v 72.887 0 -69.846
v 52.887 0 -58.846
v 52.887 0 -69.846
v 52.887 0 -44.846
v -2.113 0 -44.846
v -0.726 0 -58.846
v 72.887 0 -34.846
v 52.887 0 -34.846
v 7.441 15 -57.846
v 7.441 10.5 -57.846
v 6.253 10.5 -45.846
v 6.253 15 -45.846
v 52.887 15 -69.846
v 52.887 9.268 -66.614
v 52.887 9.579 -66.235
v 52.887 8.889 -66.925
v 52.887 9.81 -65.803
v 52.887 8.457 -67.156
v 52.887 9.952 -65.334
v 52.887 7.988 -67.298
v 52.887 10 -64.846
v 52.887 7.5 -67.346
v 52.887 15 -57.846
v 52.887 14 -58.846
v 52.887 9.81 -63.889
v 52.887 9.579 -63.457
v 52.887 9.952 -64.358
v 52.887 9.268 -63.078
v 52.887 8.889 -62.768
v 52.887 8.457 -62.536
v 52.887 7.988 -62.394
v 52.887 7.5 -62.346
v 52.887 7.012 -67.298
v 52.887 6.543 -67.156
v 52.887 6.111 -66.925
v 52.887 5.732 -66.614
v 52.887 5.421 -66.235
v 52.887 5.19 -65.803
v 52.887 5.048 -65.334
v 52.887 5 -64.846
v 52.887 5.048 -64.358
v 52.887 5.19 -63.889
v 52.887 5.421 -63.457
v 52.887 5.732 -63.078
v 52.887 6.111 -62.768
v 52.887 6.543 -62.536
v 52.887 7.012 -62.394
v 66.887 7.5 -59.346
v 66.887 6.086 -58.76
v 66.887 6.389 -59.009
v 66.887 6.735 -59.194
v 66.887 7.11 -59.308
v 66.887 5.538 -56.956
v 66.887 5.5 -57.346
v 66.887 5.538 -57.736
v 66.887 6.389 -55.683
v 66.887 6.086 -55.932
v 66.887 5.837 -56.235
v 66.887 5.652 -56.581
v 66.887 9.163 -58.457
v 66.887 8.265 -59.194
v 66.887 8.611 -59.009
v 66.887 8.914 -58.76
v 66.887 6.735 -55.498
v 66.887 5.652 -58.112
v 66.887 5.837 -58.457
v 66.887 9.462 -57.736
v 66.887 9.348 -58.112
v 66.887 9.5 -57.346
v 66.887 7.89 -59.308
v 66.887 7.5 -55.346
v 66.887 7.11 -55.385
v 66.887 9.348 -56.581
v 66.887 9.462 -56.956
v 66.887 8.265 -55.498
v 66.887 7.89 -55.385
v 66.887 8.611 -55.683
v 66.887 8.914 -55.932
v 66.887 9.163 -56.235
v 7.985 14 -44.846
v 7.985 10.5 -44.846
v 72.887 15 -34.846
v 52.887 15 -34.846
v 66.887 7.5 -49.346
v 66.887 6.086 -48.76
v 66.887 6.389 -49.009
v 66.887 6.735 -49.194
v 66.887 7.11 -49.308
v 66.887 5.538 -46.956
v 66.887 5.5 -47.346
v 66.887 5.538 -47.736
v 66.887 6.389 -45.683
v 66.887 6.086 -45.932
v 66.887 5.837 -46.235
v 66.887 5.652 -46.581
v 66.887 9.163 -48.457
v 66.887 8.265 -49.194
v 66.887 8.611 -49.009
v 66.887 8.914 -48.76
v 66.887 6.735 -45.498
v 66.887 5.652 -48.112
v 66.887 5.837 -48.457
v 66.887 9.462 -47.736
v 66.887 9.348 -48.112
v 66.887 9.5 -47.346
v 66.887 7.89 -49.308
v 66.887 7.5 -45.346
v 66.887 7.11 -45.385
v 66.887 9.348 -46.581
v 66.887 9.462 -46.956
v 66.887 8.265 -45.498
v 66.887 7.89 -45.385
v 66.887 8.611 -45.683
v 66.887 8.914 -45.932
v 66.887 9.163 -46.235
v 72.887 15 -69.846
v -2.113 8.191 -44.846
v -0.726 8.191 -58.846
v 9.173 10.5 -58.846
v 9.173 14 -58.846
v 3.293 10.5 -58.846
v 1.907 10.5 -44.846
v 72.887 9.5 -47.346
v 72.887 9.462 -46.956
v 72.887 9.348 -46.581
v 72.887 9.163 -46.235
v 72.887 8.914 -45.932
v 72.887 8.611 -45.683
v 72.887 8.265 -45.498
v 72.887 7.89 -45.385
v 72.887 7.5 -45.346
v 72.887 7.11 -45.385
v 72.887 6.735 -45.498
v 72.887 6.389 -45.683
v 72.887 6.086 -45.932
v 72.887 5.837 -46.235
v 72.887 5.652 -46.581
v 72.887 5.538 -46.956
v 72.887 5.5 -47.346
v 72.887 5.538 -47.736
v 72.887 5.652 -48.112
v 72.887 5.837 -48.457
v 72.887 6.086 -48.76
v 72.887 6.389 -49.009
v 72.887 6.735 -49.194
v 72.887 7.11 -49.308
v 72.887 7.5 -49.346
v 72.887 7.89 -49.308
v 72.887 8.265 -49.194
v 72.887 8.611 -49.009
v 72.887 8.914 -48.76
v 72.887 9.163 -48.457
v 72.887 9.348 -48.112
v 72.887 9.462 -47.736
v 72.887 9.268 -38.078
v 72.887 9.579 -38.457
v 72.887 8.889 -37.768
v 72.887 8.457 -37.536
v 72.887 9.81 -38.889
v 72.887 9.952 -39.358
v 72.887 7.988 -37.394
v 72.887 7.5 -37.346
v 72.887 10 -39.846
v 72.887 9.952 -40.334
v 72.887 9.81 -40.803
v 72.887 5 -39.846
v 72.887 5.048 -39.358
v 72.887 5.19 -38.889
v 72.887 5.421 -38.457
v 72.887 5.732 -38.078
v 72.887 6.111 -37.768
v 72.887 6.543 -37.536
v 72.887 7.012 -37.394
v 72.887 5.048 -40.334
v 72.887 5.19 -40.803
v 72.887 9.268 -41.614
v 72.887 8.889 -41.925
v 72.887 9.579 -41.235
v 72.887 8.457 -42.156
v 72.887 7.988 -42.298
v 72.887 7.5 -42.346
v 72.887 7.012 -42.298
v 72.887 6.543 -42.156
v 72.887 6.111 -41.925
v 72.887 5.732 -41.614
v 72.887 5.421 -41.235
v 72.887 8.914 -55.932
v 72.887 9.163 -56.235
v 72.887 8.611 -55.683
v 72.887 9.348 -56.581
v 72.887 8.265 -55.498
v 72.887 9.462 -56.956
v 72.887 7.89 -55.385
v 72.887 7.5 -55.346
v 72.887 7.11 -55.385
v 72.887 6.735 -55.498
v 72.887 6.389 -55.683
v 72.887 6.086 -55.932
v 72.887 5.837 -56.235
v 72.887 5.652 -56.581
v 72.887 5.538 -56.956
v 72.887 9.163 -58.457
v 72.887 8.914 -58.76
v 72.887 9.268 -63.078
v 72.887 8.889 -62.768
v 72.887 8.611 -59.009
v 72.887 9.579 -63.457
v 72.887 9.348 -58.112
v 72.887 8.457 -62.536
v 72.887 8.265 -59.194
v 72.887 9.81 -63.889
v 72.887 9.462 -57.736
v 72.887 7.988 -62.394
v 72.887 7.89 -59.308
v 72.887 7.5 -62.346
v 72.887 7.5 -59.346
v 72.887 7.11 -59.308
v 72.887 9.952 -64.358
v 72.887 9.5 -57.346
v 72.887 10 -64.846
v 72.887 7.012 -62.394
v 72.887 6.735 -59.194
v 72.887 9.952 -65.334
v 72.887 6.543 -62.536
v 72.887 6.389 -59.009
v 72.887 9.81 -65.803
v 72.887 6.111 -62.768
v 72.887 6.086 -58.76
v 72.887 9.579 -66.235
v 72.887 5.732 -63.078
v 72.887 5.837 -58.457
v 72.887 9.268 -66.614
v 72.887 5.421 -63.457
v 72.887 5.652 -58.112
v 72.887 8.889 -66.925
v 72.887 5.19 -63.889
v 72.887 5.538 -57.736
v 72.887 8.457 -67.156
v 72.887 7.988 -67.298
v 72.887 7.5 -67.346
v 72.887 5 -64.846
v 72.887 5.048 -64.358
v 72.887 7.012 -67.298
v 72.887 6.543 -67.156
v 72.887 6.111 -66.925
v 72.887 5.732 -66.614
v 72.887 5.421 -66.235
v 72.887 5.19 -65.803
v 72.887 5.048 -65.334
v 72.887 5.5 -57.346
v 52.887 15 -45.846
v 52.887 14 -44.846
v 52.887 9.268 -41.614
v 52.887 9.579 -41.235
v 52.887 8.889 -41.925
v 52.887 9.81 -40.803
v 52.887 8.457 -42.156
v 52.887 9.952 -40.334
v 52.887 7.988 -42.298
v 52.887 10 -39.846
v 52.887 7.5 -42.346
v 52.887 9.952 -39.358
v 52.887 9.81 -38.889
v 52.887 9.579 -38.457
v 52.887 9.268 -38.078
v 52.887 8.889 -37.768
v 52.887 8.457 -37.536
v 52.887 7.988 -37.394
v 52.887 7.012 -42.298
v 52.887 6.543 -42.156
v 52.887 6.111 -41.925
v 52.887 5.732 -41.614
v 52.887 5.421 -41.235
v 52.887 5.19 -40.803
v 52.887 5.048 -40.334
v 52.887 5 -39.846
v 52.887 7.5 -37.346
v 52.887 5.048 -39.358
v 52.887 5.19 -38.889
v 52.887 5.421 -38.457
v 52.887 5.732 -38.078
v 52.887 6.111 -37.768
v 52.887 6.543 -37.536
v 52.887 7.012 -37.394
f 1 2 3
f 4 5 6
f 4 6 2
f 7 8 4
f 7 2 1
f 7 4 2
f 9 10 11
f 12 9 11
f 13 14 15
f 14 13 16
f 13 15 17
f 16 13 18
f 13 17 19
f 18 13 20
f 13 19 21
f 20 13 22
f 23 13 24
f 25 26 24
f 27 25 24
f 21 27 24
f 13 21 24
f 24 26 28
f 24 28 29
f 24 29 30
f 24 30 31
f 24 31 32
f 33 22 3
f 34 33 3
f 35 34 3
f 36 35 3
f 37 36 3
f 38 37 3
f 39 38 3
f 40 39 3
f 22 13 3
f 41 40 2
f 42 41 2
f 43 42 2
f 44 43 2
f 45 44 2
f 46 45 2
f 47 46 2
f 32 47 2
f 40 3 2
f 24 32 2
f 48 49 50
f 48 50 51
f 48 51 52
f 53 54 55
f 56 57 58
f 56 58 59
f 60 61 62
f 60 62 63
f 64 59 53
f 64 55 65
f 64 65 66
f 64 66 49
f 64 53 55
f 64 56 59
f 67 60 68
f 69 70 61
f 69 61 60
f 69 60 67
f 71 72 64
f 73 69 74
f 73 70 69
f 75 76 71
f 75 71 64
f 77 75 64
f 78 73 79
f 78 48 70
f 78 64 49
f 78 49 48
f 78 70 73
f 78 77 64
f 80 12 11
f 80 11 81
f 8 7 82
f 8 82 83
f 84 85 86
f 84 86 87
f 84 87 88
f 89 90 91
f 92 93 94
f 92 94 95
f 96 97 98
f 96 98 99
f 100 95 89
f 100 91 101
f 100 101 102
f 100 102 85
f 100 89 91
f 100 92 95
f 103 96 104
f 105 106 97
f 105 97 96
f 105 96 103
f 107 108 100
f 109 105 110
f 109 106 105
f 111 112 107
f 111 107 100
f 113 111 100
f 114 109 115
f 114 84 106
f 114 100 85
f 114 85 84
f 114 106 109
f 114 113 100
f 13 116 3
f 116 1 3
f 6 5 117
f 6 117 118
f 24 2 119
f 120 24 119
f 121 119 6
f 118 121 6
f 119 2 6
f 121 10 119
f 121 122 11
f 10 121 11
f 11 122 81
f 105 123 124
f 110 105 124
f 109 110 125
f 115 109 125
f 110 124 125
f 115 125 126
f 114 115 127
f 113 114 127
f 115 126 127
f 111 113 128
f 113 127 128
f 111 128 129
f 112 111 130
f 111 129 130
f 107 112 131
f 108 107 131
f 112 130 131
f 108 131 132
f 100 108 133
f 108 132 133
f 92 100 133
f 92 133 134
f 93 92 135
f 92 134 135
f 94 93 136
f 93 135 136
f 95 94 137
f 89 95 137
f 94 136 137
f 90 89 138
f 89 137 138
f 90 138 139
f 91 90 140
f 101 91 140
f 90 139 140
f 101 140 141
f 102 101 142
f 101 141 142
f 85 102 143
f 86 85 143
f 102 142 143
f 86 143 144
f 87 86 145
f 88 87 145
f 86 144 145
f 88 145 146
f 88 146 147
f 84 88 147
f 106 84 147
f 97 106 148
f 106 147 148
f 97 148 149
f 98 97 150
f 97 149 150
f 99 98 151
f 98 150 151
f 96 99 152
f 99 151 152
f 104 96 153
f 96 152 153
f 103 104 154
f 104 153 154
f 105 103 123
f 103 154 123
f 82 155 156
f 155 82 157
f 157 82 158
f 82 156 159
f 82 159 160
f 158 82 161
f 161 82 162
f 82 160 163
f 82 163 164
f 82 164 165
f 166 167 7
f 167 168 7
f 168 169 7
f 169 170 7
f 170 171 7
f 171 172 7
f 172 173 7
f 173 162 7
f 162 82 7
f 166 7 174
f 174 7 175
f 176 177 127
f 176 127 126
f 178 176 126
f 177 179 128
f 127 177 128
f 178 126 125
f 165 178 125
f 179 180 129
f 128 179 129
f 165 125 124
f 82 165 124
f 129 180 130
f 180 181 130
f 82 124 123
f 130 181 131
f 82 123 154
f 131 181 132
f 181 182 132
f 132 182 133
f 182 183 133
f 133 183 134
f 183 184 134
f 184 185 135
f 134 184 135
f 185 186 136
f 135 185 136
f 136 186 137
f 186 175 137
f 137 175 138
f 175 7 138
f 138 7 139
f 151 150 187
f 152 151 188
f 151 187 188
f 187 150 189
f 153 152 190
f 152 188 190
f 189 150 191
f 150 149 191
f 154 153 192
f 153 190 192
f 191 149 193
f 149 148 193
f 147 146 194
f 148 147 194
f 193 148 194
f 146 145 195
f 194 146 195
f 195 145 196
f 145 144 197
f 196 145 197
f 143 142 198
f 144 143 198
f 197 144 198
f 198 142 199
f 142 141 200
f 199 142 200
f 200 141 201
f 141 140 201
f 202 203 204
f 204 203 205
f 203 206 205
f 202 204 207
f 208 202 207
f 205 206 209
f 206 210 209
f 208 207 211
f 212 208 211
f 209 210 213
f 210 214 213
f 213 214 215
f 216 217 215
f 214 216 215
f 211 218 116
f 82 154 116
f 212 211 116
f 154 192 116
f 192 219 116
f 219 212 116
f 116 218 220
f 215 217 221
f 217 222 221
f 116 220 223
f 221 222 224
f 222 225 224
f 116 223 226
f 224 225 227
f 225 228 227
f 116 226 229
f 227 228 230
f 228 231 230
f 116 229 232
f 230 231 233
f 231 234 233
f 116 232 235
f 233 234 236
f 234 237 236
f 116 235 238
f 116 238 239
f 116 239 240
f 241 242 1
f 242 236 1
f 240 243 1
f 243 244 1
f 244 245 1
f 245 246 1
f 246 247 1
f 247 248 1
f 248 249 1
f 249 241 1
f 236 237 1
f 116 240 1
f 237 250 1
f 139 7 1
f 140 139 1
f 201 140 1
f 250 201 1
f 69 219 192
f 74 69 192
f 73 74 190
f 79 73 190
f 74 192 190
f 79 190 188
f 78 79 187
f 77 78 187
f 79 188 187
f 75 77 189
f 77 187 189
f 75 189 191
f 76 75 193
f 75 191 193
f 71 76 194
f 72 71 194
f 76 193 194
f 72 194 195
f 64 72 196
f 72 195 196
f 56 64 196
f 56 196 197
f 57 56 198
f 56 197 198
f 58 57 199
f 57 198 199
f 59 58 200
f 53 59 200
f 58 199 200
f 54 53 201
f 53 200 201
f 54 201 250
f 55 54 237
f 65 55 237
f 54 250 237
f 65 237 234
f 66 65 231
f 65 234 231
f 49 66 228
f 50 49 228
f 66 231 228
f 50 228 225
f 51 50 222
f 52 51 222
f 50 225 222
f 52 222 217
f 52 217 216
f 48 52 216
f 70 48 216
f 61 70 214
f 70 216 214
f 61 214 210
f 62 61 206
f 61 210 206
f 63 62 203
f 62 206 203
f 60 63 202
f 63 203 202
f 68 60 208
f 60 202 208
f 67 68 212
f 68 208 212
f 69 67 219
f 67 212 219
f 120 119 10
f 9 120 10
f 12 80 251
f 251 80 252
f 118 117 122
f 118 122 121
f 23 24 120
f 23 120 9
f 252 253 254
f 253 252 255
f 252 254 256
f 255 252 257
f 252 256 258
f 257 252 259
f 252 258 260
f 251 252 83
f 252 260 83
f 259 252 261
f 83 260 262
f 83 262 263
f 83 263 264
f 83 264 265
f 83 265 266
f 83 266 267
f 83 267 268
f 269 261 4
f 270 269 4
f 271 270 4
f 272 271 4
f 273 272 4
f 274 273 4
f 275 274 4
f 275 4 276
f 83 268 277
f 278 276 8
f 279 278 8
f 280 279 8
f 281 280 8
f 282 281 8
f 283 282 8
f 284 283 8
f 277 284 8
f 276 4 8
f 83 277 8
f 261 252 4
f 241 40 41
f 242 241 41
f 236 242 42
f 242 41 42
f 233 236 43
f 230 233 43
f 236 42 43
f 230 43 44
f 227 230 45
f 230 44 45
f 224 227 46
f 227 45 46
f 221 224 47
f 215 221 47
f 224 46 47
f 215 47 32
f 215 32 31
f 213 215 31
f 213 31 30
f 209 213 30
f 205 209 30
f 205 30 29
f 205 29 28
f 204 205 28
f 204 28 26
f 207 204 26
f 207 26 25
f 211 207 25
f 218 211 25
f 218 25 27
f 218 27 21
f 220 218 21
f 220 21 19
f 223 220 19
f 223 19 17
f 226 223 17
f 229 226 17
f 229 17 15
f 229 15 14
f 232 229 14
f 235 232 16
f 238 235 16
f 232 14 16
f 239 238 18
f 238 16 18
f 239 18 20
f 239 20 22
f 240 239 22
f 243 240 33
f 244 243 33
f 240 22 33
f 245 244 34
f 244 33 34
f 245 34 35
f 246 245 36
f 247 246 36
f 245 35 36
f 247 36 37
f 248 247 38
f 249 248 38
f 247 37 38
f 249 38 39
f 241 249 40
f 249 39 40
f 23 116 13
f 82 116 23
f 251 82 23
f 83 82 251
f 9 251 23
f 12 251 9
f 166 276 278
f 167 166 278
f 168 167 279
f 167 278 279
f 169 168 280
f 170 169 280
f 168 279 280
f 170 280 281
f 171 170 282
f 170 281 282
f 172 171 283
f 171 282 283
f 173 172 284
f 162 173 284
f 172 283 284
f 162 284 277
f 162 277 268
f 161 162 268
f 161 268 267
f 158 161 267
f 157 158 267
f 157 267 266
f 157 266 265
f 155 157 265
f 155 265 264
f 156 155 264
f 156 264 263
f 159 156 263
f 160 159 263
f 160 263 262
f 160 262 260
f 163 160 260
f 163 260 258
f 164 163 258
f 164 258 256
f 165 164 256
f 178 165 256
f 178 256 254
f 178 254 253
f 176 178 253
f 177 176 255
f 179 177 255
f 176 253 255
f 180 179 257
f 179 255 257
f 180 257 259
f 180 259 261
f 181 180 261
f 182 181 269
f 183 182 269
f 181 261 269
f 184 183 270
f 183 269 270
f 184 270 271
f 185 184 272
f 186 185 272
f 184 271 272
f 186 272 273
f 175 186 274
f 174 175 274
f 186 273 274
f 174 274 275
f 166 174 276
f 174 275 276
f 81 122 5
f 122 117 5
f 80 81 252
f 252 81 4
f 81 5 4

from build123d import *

# Parameters (mm, degrees)
F0_W     = 6
F0_H     = 4
F0_W_2   = 20
F0_H_2   = 5
F1_DEPTH = 10.5
F2_W     = 20
F2_H     = 5
F3_DEPTH = 4.5
F4_R     = 2.5
F5_DEPTH = 20.001
F6_R     = 2
F7_DEPTH = 6
F8_SIZE  = 1
F9_SIZE2 = 2.3094010768
F9_SIZE  = 4


with BuildPart() as f1:
    # F0 (on Front) → F1 (new body)
    with BuildSketch(Plane.XZ):
        Polygon((66.887199, -59.346183), (72.887199, -59.346183), (72.887199, -55.346183), (66.887199, -55.346183), (66.887199, -57.346183), align=None)
        Polygon((52.887199, -45.846183), (6.252832, -45.846183), (7.441181, -57.846183), (52.887199, -57.846183), (52.887199, -58.846183), (52.887199, -64.846183), (72.887199, -64.846183), (72.887199, -59.346183), (66.887199, -59.346183), (65.732498, -57.346183), (66.887199, -55.346183), (72.887199, -55.346183), (72.887199, -49.346183), (66.887199, -49.346183), (65.732498, -47.346183), (66.887199, -45.346183), (72.887199, -45.346183), (72.887199, -39.846183), (52.887199, -39.846183), (52.887199, -44.846183), align=None)
        with Locations((69.887199, -47.346183)):
            Rectangle(F0_W, F0_H)
        with Locations((62.887199, -37.346183)):
            Rectangle(F0_W_2, F0_H_2)
        with Locations((62.887199, -67.346183)):
            Rectangle(F0_W_2, F0_H_2)
        Polygon((2.754653, -58.846183), (1.368245, -44.846183), (-2.112801, -44.846183), (-0.726393, -58.846183), align=None)
        Polygon((7.984883, -44.846183), (1.368245, -44.846183), (2.754653, -58.846183), (9.173232, -58.846183), (7.441181, -57.846183), (6.252832, -45.846183), align=None)
        Polygon((52.887199, -44.846183), (7.984883, -44.846183), (6.252832, -45.846183), (52.887199, -45.846183), align=None)
        Polygon((7.441181, -57.846183), (9.173232, -58.846183), (52.887199, -58.846183), (52.887199, -57.846183), align=None)
        Polygon((65.732498, -57.346183), (66.887199, -59.346183), (66.887199, -57.346183), align=None)
        Polygon((66.887199, -49.346183), (66.887199, -45.346183), (65.732498, -47.346183), align=None)
        Polygon((65.732498, -57.346183), (66.887199, -57.346183), (66.887199, -55.346183), align=None)
    extrude(amount=-F1_DEPTH)

    # F2 (on face) → F3 (join)
    with BuildSketch(Plane(origin=(0, 10.5, 0), x_dir=(-1, 0, 0), z_dir=(0, 1, 0))):
        with Locations((-62.887199, -37.346183)):
            Rectangle(F2_W, F2_H)
        Polygon((-72.887199, -55.346183), (-72.887199, -59.346183), (-72.887199, -64.846183), (-52.887199, -64.846183), (-52.887199, -58.846183), (-9.173232, -58.846183), (-7.441181, -57.846183), (-6.252832, -45.846183), (-7.984883, -44.846183), (-52.887199, -44.846183), (-52.887199, -39.846183), (-72.887199, -39.846183), (-72.887199, -45.346183), (-72.887199, -49.346183), align=None)
        with Locations((-62.887199, -67.346183)):
            Rectangle(F2_W, F2_H)
    extrude(amount=F3_DEPTH)

    # F4 (on face) → F5 (cut, through all)
    with BuildSketch(Plane(origin=(52.887199, 0, 0), x_dir=(0, -1, 0), z_dir=(-1, 0, 0))):
        with Locations((-7.5, -39.846183)):
            Circle(F4_R)
        with Locations((-7.5, -64.846183)):
            Circle(F4_R)
    extrude(amount=-F5_DEPTH, mode=Mode.SUBTRACT)

    # F6 (on face) → F7 (cut)
    with BuildSketch(Plane.YZ.offset(72.887199)):
        with Locations((7.5, -47.346183)):
            Circle(F6_R)
        with Locations((7.5, -57.346183)):
            Circle(F6_R)
    extrude(amount=-F7_DEPTH, mode=Mode.SUBTRACT)

    # F8
    f8_edges = [f1.edges().sort_by_distance(p)[0] for p in [
        (30.436041, 15, -44.846183),
        (31.030216, 15, -58.846183),
    ]]
    chamfer(f8_edges, length=F8_SIZE)

    # F9
    f9_edges = [f1.edges().sort_by_distance(p)[0] for p in [
        (-1.419597, 10.5, -51.846183),
    ]]
    f9_side = f1.faces().sort_by_distance((2.782636, 10.5, -51.840563))[0]
    chamfer(f9_edges, length=F9_SIZE, length2=F9_SIZE2, reference=f9_side)


solid = f1.part
